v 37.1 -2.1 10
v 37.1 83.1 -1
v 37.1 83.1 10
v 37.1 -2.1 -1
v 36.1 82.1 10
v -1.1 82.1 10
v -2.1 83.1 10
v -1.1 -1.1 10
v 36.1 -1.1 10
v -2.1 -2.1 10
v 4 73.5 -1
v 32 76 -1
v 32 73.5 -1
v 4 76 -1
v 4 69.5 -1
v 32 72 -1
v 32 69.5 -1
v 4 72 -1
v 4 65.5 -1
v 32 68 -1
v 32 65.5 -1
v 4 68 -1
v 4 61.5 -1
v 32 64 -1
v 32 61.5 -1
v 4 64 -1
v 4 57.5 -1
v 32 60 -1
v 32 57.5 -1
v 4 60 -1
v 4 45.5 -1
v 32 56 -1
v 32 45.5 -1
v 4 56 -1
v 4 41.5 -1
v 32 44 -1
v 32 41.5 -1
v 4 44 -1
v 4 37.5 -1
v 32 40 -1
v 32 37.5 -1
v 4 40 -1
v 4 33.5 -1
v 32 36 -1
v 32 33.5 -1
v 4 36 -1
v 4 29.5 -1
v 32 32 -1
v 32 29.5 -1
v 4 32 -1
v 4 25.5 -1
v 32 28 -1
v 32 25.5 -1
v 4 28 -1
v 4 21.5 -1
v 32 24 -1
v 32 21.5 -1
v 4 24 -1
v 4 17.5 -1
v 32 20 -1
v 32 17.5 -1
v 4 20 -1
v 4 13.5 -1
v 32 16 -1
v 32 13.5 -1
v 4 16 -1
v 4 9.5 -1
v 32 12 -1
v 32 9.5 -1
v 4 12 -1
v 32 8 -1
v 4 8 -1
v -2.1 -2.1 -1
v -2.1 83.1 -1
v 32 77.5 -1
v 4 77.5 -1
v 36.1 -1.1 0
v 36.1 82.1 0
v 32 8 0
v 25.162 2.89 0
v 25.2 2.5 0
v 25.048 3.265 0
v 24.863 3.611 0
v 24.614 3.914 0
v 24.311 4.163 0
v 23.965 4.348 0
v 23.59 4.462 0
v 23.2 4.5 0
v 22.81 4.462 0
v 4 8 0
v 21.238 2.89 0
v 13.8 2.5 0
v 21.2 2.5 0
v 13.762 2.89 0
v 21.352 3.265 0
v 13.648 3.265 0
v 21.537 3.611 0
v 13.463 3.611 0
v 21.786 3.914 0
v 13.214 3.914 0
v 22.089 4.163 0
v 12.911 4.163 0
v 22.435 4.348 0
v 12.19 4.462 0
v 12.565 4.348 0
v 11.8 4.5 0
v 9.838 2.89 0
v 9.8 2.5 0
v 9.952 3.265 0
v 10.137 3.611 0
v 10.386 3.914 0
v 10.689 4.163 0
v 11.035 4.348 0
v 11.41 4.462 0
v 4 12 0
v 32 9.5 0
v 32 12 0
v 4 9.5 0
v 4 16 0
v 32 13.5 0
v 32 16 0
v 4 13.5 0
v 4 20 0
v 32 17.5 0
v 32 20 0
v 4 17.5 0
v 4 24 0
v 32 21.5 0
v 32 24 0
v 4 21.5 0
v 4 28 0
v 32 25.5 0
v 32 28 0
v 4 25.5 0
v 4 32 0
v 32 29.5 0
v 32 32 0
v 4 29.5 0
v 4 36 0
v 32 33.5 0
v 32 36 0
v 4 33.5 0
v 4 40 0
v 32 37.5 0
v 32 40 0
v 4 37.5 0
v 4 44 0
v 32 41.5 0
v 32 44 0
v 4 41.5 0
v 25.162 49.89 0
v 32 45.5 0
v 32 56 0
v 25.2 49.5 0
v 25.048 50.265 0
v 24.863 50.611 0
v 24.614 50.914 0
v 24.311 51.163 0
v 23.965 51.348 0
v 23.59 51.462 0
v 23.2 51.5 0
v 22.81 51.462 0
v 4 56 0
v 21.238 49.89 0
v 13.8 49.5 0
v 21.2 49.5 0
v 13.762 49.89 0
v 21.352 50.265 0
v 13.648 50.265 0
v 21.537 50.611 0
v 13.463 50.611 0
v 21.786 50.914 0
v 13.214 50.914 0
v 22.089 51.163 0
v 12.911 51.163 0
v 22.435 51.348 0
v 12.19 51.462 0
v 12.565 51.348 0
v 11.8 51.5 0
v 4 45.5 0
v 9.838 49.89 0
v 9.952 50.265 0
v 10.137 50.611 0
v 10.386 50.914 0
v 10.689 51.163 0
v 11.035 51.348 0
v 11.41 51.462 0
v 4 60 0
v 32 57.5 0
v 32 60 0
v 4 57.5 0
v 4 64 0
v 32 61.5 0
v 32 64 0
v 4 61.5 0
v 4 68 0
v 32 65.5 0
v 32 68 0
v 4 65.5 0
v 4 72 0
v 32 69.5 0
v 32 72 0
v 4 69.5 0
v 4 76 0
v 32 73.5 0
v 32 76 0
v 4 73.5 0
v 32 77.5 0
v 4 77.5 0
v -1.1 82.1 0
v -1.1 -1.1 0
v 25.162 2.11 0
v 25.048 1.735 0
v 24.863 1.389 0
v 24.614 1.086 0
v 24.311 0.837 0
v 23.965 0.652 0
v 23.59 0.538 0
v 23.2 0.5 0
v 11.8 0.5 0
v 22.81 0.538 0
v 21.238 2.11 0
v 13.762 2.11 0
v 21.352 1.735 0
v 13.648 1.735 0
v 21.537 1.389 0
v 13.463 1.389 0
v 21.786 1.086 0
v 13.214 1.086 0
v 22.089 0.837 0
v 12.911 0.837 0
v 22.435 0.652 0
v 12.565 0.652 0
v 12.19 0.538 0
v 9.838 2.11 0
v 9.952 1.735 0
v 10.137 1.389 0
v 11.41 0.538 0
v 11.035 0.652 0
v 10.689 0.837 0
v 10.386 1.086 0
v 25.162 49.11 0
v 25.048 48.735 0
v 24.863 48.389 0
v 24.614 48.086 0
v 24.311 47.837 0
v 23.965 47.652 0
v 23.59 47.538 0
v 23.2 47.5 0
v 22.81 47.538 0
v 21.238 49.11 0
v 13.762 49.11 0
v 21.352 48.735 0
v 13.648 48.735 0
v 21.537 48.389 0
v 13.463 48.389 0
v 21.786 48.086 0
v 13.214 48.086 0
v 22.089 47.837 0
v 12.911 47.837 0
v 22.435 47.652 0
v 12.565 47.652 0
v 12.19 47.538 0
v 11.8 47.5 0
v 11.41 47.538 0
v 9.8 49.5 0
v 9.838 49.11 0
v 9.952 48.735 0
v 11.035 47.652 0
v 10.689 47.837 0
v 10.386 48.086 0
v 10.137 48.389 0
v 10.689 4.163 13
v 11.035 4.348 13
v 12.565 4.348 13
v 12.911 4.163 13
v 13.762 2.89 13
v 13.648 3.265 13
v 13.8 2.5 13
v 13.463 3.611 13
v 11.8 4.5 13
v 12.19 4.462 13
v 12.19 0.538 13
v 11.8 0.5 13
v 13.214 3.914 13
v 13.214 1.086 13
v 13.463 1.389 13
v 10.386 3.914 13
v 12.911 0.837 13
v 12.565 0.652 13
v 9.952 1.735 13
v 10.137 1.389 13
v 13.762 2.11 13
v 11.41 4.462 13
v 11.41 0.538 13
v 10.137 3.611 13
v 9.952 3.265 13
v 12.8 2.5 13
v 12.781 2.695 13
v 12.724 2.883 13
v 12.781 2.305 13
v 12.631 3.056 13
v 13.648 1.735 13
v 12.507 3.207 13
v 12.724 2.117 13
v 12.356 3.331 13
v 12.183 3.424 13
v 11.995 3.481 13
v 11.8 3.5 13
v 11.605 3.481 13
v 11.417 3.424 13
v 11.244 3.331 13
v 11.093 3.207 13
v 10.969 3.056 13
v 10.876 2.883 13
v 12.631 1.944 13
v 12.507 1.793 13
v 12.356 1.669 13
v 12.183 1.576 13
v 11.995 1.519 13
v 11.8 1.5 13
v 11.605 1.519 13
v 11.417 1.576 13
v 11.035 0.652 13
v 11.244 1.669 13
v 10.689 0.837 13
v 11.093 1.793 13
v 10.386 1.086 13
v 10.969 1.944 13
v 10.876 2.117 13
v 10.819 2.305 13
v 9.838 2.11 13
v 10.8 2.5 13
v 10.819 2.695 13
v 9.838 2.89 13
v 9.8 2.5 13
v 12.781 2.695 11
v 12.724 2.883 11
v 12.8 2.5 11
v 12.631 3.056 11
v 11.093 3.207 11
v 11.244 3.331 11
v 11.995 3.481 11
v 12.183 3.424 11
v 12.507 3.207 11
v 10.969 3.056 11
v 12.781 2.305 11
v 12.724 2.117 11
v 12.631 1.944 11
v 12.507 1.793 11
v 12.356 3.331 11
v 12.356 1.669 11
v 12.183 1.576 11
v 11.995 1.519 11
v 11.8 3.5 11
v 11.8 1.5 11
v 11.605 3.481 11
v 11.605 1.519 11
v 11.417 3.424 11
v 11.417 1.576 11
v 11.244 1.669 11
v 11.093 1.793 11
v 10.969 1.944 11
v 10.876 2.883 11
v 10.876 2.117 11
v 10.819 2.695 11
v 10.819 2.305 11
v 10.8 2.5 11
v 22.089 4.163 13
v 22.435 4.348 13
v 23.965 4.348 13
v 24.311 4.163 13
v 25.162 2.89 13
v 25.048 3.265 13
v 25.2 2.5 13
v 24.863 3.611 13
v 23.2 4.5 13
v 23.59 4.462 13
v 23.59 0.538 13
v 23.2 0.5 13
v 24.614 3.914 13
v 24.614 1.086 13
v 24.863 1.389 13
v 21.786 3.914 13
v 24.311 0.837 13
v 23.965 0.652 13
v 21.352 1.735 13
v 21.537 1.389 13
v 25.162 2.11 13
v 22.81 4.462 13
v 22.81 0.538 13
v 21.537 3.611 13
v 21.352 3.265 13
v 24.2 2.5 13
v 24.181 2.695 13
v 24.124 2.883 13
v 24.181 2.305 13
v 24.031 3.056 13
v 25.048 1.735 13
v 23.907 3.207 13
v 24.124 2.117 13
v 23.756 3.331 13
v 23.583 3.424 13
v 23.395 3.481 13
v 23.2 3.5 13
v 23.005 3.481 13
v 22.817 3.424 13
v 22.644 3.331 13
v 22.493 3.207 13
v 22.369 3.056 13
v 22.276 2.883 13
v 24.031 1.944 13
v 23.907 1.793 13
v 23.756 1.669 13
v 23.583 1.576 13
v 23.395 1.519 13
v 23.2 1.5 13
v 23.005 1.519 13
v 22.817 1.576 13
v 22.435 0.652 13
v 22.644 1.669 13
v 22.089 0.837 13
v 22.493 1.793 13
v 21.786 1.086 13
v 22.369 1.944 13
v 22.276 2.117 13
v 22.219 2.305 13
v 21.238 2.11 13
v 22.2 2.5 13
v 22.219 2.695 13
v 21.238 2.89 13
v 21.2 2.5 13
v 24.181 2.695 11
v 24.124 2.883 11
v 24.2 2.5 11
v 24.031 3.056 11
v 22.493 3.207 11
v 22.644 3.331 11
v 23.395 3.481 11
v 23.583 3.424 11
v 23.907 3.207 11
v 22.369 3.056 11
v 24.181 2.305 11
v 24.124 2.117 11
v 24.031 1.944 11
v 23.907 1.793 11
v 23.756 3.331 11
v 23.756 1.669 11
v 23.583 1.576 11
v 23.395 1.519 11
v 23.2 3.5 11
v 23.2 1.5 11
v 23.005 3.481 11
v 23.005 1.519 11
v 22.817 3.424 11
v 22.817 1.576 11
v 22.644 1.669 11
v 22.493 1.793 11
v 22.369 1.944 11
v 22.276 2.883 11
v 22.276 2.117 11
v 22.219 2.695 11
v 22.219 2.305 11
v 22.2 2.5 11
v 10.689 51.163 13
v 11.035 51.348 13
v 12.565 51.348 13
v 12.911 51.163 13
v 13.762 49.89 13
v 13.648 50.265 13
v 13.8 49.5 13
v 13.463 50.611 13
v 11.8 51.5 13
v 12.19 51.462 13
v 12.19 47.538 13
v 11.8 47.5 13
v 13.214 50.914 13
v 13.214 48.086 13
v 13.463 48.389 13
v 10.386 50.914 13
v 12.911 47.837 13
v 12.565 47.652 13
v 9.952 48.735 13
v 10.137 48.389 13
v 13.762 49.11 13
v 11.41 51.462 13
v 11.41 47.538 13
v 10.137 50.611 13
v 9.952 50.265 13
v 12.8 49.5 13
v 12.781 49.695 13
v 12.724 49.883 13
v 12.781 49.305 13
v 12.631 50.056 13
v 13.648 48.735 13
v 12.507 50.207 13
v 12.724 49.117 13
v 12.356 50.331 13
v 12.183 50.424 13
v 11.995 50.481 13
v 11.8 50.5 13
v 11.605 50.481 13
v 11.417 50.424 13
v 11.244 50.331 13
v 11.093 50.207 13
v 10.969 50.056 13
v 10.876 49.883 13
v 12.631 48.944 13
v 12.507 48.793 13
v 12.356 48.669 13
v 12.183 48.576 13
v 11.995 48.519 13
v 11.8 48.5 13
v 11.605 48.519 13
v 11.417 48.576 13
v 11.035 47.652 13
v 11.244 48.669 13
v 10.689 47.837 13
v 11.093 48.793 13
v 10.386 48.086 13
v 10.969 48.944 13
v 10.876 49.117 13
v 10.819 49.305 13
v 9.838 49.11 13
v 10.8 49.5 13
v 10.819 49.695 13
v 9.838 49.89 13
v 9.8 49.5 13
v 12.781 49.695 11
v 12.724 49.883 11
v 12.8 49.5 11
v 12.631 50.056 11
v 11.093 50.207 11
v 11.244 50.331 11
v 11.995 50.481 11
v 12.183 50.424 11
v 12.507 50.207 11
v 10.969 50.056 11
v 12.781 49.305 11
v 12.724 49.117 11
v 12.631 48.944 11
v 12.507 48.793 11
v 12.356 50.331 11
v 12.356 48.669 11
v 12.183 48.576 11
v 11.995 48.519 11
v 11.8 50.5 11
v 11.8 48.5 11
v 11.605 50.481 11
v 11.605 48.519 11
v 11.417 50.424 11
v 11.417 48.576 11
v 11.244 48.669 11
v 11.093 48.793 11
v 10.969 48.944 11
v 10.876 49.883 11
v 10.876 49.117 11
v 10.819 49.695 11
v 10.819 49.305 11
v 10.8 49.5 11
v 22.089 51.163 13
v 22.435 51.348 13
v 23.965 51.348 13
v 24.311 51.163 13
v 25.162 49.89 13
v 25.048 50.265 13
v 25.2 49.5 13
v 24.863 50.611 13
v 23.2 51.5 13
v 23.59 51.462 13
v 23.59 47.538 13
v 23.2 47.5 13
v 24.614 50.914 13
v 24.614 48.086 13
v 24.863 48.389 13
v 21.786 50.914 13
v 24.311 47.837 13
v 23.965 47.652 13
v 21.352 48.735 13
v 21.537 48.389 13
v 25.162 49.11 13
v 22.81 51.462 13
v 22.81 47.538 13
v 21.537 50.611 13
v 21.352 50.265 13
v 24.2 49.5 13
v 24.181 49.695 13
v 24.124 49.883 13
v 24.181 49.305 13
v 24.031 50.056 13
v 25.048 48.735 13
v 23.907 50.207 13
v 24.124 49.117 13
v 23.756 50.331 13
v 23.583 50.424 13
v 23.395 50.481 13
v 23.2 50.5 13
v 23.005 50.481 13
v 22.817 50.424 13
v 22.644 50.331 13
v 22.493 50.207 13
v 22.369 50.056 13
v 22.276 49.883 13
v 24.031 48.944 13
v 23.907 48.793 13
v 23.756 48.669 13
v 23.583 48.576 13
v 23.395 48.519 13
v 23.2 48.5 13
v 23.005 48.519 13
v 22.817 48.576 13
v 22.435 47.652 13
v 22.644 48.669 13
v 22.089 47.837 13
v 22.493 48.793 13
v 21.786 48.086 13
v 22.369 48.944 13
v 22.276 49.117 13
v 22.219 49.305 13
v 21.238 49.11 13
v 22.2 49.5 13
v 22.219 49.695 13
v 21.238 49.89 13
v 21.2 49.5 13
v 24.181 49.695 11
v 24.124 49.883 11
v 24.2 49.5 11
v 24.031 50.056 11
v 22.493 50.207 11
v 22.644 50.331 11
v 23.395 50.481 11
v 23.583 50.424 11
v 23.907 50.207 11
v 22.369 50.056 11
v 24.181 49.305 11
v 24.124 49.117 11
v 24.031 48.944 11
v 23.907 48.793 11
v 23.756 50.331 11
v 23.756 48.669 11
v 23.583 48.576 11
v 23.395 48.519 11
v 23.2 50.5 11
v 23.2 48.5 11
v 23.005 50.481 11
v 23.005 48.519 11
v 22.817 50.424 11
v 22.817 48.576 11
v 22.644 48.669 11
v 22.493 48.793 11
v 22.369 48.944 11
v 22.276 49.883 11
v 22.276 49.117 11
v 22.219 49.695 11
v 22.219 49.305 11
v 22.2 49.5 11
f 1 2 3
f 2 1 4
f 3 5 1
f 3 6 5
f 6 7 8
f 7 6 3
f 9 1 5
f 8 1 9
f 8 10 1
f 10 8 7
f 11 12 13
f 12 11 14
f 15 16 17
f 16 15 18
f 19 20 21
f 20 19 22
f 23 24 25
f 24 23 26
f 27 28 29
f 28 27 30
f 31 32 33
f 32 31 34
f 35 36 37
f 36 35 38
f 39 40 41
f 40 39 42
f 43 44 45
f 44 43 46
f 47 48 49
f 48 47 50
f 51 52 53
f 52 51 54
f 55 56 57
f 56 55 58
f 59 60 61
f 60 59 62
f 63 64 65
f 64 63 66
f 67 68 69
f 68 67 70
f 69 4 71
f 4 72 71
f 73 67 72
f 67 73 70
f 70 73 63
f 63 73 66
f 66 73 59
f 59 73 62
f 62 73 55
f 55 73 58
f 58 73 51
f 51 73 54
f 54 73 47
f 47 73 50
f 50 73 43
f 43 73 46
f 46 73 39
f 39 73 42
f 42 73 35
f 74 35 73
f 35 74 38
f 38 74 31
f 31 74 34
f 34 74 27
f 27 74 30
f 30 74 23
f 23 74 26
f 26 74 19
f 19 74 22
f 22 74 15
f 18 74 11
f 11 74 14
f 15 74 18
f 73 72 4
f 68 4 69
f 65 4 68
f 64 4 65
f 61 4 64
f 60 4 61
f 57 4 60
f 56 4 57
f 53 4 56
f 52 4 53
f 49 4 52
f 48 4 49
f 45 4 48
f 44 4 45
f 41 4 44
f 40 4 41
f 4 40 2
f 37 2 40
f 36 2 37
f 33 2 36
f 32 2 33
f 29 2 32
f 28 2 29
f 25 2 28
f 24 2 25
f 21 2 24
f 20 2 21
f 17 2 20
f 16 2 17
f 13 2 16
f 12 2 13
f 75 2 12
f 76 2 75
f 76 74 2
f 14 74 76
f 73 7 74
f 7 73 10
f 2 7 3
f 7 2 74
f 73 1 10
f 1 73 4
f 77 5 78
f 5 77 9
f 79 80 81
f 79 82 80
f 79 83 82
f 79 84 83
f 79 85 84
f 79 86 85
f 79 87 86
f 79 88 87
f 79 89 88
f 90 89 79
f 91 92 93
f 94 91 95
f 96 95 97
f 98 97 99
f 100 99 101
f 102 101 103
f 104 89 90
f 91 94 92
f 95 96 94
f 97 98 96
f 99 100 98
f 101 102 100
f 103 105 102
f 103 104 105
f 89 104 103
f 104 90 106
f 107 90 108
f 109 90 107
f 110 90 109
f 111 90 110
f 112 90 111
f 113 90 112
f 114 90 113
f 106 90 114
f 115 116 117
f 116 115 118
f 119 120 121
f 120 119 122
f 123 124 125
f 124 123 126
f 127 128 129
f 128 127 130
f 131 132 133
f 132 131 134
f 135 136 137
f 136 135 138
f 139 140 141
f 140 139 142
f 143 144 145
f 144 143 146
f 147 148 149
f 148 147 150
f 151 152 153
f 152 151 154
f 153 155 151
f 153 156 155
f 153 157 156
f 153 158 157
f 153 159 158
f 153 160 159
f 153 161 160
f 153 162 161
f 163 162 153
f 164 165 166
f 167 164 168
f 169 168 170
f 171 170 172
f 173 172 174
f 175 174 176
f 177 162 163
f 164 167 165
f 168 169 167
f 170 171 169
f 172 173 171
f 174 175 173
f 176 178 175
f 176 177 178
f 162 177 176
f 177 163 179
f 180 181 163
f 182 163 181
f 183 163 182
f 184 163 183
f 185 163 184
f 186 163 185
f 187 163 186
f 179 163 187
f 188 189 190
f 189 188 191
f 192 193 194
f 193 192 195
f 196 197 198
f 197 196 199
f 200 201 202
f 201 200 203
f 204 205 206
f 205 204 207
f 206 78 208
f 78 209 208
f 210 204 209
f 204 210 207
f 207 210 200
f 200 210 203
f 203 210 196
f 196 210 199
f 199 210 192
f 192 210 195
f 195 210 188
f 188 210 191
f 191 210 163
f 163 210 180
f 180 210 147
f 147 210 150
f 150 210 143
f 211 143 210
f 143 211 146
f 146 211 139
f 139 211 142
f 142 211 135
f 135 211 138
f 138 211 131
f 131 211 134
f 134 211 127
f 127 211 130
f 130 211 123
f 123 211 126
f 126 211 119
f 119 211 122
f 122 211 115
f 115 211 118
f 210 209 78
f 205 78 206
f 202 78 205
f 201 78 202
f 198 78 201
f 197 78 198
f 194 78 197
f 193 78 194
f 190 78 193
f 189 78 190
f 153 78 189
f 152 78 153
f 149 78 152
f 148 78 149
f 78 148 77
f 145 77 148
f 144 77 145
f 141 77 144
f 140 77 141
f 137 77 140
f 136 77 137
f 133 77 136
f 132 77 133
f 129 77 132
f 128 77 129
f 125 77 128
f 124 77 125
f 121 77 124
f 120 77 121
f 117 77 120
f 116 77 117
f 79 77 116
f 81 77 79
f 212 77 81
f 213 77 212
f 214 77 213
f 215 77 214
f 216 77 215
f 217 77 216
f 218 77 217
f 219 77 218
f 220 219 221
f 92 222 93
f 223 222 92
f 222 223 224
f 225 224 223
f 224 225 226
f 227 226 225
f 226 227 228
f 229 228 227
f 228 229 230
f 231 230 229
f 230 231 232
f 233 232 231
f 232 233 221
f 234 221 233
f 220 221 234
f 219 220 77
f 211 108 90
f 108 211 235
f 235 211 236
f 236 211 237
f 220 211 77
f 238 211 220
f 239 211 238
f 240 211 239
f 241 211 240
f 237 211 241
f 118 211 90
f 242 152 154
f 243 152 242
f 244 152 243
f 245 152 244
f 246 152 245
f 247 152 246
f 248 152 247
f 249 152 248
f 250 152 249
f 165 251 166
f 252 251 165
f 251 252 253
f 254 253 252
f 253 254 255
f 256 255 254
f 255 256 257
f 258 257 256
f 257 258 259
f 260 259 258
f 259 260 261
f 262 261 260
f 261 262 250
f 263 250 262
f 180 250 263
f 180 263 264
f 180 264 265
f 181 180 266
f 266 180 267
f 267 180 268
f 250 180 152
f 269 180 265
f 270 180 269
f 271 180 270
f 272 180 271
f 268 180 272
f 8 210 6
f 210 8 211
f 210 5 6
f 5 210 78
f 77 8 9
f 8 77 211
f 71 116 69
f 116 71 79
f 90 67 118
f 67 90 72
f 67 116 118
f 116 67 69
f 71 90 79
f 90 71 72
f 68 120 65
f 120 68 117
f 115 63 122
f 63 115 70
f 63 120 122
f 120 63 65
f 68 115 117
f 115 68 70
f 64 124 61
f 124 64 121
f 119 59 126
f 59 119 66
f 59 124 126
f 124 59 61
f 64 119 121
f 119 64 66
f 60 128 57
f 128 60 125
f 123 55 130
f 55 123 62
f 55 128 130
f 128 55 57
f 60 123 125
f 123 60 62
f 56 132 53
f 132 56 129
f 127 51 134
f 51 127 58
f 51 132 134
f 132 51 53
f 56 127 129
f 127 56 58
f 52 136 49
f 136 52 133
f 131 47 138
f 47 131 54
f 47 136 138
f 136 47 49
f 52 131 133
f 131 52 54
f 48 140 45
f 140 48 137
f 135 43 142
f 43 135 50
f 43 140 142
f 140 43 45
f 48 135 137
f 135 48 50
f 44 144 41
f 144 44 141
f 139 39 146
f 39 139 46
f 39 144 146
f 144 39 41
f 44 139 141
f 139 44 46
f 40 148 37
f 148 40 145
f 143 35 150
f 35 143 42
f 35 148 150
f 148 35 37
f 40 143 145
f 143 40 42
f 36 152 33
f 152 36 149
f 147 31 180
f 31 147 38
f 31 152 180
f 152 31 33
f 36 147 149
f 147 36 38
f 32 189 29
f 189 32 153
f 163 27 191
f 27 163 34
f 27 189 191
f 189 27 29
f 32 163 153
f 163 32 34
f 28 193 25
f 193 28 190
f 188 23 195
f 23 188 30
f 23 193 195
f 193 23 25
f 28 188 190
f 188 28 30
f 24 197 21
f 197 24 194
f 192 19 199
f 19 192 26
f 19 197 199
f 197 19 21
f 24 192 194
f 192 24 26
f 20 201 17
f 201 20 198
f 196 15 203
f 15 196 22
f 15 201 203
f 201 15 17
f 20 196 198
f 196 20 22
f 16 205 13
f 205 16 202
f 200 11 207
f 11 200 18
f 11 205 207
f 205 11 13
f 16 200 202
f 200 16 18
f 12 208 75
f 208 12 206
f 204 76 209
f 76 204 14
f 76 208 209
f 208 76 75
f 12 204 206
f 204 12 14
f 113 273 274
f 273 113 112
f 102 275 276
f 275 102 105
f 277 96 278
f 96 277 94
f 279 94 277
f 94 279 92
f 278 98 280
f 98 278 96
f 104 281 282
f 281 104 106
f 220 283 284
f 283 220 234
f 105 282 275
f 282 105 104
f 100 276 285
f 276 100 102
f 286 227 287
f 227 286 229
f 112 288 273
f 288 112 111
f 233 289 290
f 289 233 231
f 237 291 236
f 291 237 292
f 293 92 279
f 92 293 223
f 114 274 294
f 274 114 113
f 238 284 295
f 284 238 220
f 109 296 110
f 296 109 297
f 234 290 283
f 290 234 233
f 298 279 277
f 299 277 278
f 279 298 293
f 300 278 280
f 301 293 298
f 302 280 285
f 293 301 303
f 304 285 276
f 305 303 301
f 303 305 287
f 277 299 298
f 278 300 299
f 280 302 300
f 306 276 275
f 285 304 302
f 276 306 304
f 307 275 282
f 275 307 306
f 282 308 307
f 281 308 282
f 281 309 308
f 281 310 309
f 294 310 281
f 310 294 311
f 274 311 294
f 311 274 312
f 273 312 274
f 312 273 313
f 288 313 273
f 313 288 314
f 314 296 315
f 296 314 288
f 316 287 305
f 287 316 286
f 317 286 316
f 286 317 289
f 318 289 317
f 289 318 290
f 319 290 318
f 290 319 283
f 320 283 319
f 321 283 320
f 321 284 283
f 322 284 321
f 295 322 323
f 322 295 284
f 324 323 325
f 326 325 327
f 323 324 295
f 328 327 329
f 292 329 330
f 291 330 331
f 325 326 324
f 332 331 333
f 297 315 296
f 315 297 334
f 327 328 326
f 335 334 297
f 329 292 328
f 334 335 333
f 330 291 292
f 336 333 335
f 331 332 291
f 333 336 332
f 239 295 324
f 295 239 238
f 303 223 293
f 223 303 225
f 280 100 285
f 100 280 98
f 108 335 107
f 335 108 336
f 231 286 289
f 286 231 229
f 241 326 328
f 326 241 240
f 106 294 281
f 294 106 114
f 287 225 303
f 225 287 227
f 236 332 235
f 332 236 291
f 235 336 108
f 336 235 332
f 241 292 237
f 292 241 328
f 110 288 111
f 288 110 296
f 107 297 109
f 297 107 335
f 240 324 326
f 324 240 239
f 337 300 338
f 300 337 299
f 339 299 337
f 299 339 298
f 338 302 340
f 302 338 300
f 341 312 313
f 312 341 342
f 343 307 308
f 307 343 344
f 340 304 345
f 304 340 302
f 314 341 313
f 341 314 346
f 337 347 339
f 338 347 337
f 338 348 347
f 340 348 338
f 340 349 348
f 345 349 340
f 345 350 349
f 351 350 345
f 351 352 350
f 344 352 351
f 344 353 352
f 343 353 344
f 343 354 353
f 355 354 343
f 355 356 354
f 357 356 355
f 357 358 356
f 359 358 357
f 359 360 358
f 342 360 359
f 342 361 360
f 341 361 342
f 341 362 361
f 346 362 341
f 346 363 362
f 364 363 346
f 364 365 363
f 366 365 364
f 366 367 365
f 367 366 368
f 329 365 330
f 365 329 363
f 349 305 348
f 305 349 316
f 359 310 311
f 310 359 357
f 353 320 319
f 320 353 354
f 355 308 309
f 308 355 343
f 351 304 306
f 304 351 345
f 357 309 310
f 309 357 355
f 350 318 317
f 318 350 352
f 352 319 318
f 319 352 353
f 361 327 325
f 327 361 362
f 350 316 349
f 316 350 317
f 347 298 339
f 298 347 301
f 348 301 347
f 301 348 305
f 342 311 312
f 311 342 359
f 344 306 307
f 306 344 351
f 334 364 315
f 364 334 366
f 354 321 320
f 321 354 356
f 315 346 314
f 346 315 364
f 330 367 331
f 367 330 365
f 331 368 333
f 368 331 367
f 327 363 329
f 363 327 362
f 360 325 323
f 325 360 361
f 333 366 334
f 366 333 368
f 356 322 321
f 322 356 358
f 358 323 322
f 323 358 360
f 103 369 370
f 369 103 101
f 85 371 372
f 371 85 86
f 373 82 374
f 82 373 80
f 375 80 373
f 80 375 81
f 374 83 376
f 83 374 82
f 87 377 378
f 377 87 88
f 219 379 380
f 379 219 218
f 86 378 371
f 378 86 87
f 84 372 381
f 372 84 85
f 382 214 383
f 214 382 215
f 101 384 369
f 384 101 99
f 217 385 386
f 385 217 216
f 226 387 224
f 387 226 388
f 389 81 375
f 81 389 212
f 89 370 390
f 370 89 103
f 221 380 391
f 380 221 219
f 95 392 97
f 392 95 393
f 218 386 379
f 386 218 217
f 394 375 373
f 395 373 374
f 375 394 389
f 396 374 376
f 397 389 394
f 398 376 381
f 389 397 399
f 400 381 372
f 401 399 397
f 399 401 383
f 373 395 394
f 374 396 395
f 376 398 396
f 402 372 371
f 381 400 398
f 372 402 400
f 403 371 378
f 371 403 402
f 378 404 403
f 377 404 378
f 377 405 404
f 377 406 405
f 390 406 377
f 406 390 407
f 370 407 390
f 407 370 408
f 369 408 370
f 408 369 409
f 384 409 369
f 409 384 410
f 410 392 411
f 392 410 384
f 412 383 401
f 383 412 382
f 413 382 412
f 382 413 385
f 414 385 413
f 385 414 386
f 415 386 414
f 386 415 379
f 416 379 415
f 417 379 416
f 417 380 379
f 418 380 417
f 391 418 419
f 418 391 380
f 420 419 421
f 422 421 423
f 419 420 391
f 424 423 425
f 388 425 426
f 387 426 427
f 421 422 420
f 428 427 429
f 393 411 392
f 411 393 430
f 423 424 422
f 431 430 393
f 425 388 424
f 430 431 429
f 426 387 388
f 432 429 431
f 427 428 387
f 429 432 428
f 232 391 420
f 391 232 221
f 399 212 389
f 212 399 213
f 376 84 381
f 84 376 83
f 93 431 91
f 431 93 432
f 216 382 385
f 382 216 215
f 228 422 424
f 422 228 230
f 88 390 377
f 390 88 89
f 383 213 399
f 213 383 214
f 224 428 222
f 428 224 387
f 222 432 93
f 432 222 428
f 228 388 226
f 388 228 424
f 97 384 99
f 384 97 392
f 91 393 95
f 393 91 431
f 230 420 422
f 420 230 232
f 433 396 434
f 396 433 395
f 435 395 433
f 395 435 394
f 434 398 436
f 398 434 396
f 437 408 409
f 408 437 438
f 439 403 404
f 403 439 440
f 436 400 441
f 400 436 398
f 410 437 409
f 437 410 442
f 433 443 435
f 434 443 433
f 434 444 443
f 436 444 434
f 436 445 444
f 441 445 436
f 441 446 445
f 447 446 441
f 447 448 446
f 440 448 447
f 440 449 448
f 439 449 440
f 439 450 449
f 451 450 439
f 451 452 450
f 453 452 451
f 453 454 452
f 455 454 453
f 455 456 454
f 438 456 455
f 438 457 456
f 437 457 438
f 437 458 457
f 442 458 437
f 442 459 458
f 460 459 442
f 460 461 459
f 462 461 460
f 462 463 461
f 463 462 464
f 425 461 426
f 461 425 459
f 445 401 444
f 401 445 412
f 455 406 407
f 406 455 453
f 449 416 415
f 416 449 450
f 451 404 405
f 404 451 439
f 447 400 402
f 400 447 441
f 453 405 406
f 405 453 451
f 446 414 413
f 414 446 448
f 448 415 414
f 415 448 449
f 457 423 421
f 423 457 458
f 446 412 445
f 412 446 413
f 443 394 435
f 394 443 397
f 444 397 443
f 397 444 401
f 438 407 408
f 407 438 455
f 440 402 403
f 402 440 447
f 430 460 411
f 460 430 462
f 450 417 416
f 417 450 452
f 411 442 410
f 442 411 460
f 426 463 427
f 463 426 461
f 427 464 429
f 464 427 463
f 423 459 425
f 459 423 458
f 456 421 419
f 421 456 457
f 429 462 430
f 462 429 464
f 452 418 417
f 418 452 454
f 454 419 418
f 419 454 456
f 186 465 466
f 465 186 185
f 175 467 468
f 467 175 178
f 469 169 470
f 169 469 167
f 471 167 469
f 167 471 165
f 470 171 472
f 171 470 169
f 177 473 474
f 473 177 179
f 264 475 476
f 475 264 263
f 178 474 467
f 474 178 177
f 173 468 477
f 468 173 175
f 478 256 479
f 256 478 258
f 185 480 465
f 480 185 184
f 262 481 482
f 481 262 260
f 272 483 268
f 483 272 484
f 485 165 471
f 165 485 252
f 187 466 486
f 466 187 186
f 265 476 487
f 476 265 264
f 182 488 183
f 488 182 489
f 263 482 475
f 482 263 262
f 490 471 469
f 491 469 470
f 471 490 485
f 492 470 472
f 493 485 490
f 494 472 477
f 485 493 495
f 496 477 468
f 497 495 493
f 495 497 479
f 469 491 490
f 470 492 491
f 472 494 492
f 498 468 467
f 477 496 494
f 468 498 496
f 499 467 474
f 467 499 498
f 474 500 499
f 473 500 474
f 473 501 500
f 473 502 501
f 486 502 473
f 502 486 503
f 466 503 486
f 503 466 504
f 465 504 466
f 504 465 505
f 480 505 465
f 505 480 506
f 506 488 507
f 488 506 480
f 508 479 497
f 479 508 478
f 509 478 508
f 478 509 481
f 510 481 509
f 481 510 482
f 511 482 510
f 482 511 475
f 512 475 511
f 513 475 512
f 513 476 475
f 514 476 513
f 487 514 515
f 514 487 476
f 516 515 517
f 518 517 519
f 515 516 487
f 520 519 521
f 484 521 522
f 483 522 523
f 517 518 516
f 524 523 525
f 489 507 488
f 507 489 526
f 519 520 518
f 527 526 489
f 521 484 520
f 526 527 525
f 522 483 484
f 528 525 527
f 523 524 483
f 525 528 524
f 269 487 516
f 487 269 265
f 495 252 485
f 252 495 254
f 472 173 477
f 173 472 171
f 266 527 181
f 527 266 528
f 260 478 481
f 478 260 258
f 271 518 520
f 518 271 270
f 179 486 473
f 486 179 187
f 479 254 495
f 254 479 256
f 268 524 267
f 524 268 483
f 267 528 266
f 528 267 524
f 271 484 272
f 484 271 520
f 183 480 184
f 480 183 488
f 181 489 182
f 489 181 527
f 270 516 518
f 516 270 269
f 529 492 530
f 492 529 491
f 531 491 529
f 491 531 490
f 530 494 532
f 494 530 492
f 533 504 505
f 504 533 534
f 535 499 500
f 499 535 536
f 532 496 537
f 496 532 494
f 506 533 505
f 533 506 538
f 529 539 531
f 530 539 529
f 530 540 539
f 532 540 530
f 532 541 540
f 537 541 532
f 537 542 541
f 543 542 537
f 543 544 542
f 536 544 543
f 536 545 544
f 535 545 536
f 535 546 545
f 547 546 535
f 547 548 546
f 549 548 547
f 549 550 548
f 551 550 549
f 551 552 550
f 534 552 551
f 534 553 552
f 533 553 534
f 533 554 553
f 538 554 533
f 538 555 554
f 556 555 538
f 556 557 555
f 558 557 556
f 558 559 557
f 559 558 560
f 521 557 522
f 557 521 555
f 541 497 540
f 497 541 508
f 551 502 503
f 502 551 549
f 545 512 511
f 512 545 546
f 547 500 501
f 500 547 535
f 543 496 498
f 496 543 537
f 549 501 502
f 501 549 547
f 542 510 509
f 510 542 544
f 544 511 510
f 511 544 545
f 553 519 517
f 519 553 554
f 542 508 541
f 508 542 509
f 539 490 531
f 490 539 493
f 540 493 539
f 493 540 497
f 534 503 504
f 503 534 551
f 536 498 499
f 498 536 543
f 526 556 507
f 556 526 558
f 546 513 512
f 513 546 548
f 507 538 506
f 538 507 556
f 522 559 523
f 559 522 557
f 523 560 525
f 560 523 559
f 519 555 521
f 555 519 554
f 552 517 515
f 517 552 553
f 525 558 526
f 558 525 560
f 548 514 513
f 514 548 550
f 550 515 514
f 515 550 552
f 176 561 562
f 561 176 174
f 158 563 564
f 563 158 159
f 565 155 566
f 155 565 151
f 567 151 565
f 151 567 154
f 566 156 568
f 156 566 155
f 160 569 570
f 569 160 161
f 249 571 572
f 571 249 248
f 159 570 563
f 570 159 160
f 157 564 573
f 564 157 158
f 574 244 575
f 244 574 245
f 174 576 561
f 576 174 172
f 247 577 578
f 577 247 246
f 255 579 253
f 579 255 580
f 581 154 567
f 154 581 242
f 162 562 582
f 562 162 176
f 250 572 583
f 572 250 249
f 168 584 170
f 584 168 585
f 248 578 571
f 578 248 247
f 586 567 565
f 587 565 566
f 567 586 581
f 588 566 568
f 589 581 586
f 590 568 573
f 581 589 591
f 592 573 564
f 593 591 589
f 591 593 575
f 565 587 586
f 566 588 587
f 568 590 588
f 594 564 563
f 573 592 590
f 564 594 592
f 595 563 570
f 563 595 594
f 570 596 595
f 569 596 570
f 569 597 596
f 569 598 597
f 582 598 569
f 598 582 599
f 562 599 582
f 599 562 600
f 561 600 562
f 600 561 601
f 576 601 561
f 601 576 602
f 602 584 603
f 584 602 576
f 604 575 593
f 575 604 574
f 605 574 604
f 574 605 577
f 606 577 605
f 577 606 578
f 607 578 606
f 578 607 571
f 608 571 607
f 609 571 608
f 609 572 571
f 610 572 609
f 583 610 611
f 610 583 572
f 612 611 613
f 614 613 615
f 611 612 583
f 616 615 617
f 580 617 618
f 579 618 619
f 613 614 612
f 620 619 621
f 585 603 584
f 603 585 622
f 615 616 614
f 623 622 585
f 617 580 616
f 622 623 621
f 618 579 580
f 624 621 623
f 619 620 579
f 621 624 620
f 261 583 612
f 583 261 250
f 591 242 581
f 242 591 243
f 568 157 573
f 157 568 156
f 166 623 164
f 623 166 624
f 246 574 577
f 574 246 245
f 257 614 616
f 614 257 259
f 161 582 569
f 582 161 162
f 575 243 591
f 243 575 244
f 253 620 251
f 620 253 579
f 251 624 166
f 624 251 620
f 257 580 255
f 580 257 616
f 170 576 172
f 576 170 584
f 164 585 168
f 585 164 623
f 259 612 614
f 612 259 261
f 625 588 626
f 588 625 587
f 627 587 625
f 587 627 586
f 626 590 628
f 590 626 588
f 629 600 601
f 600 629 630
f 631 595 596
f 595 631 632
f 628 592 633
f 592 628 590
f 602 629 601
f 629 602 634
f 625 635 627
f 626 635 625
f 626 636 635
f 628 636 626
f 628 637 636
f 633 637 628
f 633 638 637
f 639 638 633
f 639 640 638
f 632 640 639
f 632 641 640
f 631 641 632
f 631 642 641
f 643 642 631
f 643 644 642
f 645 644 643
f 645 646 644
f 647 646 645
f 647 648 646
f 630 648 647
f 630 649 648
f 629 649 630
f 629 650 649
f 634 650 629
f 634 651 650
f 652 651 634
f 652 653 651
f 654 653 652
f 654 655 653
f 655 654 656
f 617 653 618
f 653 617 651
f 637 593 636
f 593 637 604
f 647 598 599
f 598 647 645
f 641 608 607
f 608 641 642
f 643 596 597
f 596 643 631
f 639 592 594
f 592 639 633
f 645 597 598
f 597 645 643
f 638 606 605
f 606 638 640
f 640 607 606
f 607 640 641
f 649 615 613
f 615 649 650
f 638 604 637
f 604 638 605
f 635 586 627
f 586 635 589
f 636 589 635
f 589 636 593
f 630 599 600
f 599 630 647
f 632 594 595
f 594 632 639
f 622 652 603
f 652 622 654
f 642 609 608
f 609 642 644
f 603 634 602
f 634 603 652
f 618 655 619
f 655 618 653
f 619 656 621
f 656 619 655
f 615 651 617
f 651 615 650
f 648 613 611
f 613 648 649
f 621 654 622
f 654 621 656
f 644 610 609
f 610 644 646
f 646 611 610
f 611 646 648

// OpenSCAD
// file: pico.scad
use <generic.scad>;

module picoStuds()
{
    union() {
        translate([4.8, 2, 0]) stud(1, 5);
        translate([16.2, 2, 0]) stud(1, 5);
        translate([4.8, 49, 0]) stud(1, 5);
        translate([16.2, 49, 0]) stud(1, 5);
    }
}

module picoStudHoles(h)
{    
    union() {
        translate([4.8, 2, 0]) studHole(1, h);
        translate([16.2, 2, 0])studHole(1, h);
        translate([4.8, 49, 0]) studHole(1, h);
        translate([16.2, 49, 0]) studHole(1, h);
    }
}

module piZeroStuds(h)
{
    union() {
        translate([3.5, 3.5, 0]) stud(1.3, h);
        translate([61.5, 3.5, 0]) stud(1.3, h);
        translate([3.5, 26.5, 0]) stud(1.3, h);
        translate([61.5, 26.5, 0]) stud(1.3, h);
    }
}
// file: generic.scad
module myBox(w,d,h) 
{
    translate([-1,-1,-1])
    difference() {
        cube([w+2, d+2, h+1]);
        translate([1, 1, 1])
            cube([w, d, h]);
    }
}

module stud(radius, h)
{    
    union() {
        cylinder(h, radius + 0.7, radius+0.7);
        translate([0,0, h])
        cylinder(3, radius, radius);        
    }
}

module studHole(radius, h)
{    
    difference() {
        cylinder(h, radius + 1, radius+1);
        translate([0,0,h-2])
        cylinder(2, radius, radius);
    }    
}
// main file
$fn=32;

use <generic.scad>;
use <pico.scad>;

difference() {    
    translate([-1.1,-1.1,0]) myBox(37.2,83.2, 10);
    
    for (a = [2:11]) {
        translate([4, a* 4, -3]) cube([28,1.5,6]);
    }
    for (a = [14:19]) {
        translate([4, a* 4, -3]) cube([28,1.5,6]);
    }
}

translate([7, 0.5, 0]) 
    picoStudHoles(13);
